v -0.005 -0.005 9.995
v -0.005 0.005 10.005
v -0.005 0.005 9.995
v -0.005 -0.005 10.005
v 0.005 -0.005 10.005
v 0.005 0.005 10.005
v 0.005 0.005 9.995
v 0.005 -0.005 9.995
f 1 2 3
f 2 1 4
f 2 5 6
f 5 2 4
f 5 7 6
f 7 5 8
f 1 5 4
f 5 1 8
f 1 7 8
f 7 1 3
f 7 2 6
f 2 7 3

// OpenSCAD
filename_variable = "pattern3.png"; // [image_surface:30x30]
treshold=0.5;//[0:0.01:1]
stereographic();
*pix();
module stereographic(){
intersection(){
translate([0,0,5])
difference(){
sphere(5.5,$fn=50);
sphere(5,$fn=50);
 }
 
 for(i=[-10:1:10]){
    for(j=[-10:1:10])
{
hull(){
translate([0,0,10])  cube(0.01,center=true);
 intersection(){
 translate([i,j,0 ])scale([1 ,1,1])cube([1,1,0.001],center=true);//scale to aero you cant generate 0 hright cube
pix();// flat map
}

}}}
}}

module
pix(){
 
translate([0,0,-10*treshold])resize([20,20,10])surface(filename_variable,center=true);
 
}

function rnd(a=1,b=0)=(rands(min(a,b),max(a,b),1)[0]); 
